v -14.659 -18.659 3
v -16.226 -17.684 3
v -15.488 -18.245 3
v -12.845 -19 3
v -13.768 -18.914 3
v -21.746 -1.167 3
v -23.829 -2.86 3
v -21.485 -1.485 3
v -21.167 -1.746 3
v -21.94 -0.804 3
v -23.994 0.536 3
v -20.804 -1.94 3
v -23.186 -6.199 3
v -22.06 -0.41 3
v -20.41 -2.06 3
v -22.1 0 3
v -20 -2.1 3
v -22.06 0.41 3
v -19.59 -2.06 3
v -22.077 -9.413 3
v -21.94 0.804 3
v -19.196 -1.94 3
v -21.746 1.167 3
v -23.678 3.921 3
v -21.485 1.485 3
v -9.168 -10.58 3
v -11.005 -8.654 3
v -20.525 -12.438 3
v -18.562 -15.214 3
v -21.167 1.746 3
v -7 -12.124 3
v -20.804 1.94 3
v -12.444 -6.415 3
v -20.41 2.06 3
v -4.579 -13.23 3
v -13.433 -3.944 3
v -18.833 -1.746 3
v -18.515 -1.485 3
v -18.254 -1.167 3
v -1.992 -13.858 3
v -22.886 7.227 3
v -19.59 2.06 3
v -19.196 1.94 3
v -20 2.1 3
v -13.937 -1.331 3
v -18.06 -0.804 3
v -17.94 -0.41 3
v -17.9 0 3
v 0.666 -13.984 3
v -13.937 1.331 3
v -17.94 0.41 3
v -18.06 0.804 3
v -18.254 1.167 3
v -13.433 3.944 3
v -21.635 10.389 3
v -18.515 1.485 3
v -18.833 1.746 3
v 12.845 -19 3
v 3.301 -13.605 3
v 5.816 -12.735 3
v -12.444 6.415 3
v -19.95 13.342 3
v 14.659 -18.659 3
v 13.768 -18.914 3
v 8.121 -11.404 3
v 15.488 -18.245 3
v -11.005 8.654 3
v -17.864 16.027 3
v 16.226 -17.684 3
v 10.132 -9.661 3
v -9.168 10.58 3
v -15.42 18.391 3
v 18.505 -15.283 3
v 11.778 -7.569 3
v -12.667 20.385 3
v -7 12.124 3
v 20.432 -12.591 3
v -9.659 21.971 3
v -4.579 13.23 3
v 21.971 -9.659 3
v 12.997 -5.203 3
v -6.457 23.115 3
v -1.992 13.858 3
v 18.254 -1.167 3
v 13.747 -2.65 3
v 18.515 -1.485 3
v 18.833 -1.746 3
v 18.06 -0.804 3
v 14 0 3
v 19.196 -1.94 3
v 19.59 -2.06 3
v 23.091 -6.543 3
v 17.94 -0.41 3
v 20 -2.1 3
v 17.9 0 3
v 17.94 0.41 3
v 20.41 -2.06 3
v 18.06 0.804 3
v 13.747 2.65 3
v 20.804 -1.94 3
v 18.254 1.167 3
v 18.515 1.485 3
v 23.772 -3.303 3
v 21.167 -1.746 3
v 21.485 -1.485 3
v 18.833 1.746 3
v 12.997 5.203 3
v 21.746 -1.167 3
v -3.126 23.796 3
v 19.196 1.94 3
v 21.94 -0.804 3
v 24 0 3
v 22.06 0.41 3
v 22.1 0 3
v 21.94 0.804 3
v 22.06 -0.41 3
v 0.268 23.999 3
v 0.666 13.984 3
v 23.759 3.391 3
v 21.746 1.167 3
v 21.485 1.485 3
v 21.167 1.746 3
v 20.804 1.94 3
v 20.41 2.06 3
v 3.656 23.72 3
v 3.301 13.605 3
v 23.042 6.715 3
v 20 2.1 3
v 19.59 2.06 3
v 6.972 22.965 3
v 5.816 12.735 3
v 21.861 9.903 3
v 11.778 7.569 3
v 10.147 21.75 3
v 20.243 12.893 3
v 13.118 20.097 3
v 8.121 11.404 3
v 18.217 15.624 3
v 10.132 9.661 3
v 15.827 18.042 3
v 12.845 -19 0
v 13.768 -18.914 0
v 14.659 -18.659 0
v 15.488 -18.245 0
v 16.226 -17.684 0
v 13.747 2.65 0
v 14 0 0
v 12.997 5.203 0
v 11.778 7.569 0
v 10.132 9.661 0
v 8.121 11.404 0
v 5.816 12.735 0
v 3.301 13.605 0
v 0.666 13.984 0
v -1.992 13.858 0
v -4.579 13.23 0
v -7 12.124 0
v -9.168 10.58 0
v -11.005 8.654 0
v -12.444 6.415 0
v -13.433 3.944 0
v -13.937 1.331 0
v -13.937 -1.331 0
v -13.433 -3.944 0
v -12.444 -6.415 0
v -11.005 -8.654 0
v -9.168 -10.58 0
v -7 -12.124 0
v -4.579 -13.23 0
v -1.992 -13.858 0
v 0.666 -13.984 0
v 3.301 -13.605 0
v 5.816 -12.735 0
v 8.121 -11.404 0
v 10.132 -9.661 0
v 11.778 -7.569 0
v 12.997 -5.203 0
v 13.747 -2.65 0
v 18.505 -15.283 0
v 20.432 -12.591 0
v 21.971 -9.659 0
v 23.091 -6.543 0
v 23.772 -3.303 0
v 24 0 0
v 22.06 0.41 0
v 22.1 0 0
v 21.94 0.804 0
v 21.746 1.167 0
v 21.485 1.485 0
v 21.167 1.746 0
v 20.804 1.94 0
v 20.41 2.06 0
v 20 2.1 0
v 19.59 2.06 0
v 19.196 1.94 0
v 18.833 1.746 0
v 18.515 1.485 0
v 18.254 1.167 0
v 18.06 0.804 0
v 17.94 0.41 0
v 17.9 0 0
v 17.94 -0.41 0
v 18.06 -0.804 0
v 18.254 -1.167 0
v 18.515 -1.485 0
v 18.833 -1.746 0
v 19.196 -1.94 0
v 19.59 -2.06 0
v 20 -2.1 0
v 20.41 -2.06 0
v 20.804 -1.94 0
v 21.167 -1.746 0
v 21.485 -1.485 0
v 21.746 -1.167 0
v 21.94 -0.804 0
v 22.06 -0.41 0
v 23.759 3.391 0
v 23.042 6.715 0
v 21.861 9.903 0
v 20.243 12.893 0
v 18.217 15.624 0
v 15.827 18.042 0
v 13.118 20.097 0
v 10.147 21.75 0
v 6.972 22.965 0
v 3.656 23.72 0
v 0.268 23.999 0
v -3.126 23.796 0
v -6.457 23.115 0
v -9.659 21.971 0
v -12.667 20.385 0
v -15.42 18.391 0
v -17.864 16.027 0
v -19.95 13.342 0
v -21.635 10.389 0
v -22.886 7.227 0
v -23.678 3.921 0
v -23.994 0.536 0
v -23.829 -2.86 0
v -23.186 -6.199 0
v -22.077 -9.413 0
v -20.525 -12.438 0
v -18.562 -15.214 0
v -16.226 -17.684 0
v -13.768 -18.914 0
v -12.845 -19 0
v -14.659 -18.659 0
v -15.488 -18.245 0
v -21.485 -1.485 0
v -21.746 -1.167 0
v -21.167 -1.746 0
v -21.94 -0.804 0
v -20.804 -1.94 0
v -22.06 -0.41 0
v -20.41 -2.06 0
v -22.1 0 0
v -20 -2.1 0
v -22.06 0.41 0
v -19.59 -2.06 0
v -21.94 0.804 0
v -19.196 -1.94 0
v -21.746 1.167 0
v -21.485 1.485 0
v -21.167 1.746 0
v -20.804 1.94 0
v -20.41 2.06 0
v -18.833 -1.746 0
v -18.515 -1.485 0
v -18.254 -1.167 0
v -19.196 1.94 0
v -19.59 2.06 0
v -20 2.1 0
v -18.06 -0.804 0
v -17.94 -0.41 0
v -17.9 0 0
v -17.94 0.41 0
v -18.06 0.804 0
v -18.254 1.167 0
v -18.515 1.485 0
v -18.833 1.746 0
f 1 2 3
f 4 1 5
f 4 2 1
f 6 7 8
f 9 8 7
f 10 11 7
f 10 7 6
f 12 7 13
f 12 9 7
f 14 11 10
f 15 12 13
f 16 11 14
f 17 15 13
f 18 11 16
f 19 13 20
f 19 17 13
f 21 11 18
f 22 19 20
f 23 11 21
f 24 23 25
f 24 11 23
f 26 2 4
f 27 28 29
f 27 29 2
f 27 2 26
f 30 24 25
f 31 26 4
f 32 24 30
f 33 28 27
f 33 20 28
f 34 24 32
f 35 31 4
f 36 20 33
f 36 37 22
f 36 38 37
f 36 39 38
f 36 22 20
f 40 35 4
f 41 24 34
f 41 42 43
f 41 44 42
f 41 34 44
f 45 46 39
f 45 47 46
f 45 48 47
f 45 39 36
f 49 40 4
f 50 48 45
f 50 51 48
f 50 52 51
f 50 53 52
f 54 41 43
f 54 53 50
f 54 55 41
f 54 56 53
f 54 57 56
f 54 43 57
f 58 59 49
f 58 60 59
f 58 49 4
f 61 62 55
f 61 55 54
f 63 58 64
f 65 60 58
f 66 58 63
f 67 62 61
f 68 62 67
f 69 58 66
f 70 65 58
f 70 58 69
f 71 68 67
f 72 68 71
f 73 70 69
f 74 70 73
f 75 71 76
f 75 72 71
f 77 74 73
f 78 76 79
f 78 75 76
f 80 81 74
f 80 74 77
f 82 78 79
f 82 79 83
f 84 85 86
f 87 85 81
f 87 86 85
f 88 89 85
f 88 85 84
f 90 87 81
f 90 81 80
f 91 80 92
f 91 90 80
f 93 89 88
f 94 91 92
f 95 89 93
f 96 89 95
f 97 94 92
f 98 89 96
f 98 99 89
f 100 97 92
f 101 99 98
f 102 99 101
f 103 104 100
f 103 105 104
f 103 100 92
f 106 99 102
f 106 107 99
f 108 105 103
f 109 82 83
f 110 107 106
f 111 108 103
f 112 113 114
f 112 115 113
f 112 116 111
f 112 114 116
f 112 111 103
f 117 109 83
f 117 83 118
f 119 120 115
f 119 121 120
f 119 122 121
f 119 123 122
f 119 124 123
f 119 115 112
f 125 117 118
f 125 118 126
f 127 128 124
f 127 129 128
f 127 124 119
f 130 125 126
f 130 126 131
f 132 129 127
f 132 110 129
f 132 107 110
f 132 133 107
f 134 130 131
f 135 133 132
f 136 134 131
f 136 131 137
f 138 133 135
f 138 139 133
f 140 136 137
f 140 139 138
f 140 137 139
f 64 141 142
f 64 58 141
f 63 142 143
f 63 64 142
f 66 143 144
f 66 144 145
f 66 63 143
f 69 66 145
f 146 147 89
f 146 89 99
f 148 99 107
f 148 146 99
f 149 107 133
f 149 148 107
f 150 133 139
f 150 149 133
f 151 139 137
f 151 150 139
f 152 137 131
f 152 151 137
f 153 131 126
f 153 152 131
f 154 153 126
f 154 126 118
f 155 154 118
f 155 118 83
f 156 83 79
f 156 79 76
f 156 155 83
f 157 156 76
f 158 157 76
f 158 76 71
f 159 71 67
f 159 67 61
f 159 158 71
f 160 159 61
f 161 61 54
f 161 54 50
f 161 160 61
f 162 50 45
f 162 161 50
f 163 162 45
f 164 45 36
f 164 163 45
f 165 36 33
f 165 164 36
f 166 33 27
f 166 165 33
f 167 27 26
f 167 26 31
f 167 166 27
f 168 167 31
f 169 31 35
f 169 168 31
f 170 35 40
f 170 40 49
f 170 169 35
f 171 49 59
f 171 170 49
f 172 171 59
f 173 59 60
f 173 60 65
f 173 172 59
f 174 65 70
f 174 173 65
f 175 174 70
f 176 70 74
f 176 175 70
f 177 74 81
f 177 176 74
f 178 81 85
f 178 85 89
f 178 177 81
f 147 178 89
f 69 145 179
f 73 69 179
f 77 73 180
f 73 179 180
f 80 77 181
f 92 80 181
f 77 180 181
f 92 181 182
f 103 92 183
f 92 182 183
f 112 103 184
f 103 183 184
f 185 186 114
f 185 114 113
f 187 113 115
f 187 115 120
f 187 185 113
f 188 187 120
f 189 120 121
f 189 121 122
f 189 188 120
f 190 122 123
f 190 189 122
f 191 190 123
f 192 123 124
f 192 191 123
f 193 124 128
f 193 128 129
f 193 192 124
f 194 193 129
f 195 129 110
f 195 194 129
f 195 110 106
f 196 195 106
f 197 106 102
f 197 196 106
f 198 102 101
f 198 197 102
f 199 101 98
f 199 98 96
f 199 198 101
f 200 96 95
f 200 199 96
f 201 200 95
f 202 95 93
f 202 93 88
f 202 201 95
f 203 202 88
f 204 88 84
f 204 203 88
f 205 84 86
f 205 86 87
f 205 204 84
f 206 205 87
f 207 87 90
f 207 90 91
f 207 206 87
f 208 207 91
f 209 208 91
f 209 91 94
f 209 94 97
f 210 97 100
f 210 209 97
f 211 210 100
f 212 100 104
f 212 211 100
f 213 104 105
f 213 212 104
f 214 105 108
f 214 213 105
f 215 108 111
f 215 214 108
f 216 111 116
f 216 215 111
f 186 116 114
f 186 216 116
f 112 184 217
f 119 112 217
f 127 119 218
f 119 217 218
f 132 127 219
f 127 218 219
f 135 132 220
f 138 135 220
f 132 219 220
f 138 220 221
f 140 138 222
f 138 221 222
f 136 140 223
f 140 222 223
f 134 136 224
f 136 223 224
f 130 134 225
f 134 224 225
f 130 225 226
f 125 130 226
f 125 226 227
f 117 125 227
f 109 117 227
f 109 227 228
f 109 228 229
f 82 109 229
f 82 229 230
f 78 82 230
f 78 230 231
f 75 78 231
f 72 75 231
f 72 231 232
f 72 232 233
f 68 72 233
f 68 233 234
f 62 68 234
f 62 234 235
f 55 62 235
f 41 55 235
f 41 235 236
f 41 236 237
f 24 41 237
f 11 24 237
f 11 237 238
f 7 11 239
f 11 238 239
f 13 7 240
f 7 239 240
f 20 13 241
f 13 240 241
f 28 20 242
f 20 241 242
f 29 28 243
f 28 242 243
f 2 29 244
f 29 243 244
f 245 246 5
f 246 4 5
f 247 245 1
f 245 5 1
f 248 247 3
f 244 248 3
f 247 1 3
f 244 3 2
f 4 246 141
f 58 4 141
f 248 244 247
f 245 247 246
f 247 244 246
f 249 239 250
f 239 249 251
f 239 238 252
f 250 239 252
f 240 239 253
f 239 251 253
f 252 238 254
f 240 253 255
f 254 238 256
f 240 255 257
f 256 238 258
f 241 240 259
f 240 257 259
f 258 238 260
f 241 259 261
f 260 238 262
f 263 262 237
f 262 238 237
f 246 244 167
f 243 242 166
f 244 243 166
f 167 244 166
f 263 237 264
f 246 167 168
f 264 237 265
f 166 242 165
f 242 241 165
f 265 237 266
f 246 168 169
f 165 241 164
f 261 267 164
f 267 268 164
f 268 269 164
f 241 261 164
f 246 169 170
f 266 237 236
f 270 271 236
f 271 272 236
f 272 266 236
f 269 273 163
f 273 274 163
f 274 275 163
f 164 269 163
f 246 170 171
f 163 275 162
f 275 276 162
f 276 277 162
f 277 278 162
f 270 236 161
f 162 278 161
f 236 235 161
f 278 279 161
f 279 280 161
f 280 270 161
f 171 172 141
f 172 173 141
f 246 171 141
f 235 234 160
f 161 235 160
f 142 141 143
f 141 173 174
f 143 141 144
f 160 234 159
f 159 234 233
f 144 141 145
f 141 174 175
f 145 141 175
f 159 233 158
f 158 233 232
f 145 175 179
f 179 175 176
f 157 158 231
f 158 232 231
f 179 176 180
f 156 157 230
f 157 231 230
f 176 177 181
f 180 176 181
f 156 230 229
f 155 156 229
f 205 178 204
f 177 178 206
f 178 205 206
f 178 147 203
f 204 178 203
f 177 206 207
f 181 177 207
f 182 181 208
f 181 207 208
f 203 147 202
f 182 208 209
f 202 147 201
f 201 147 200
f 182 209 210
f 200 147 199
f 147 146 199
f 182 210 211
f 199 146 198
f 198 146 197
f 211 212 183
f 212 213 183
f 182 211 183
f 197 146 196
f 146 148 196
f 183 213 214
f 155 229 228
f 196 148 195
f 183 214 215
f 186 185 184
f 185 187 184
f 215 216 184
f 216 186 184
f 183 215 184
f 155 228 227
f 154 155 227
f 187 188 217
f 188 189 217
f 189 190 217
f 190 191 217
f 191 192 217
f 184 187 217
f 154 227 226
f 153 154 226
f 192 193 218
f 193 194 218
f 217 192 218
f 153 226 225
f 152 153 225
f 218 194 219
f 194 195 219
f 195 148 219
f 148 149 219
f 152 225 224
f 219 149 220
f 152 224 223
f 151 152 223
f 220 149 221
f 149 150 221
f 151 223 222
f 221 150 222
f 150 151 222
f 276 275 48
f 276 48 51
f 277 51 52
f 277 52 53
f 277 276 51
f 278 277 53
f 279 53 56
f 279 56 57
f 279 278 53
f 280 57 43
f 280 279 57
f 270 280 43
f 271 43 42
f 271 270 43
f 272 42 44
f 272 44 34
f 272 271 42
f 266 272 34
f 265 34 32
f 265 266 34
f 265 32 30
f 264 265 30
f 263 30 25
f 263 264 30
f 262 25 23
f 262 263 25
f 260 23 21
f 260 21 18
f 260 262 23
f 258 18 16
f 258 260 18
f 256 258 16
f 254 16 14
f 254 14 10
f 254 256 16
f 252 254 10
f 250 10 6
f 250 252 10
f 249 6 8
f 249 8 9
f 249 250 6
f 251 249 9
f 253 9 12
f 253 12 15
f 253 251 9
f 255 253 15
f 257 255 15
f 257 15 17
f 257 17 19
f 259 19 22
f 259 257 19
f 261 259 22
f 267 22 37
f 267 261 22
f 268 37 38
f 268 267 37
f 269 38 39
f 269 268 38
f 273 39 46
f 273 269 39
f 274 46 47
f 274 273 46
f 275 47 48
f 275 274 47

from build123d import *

# Parameters (mm, degrees)
ESBO_O1_R                = 2.1
ESBO_O1_R_2              = 14
RESSALTO_EXTRUS_O1_DEPTH = 3
FILETE1_R                = 5


with BuildPart() as part:
    # Esboço1 → Ressalto-extrusão1 (new body)
    with BuildSketch(Plane.XY):
        with BuildLine():
            Line((-14.662878299, -19), (14.662878299, -19))
            ThreePointArc((14.662878299, -19), (21.539603979, -10.585152829), (24, 0))
            ThreePointArc((24, 0), (-10.585152829, 21.539603979), (-14.662878299, -19))
        make_face()
        with Locations((-20, 0)):
            Circle(ESBO_O1_R, mode=Mode.SUBTRACT)
        Circle(ESBO_O1_R_2, mode=Mode.SUBTRACT)
        with Locations((20, 0)):
            Circle(ESBO_O1_R, mode=Mode.SUBTRACT)
    extrude(amount=RESSALTO_EXTRUS_O1_DEPTH)

    # Filete1
    filete1_edges = [part.edges().sort_by_distance(p)[0] for p in [
        (-14.662878299, -19, 1.5),
        (14.662878299, -19, 1.5),
    ]]
    fillet(filete1_edges, radius=FILETE1_R)


solid = part.part
